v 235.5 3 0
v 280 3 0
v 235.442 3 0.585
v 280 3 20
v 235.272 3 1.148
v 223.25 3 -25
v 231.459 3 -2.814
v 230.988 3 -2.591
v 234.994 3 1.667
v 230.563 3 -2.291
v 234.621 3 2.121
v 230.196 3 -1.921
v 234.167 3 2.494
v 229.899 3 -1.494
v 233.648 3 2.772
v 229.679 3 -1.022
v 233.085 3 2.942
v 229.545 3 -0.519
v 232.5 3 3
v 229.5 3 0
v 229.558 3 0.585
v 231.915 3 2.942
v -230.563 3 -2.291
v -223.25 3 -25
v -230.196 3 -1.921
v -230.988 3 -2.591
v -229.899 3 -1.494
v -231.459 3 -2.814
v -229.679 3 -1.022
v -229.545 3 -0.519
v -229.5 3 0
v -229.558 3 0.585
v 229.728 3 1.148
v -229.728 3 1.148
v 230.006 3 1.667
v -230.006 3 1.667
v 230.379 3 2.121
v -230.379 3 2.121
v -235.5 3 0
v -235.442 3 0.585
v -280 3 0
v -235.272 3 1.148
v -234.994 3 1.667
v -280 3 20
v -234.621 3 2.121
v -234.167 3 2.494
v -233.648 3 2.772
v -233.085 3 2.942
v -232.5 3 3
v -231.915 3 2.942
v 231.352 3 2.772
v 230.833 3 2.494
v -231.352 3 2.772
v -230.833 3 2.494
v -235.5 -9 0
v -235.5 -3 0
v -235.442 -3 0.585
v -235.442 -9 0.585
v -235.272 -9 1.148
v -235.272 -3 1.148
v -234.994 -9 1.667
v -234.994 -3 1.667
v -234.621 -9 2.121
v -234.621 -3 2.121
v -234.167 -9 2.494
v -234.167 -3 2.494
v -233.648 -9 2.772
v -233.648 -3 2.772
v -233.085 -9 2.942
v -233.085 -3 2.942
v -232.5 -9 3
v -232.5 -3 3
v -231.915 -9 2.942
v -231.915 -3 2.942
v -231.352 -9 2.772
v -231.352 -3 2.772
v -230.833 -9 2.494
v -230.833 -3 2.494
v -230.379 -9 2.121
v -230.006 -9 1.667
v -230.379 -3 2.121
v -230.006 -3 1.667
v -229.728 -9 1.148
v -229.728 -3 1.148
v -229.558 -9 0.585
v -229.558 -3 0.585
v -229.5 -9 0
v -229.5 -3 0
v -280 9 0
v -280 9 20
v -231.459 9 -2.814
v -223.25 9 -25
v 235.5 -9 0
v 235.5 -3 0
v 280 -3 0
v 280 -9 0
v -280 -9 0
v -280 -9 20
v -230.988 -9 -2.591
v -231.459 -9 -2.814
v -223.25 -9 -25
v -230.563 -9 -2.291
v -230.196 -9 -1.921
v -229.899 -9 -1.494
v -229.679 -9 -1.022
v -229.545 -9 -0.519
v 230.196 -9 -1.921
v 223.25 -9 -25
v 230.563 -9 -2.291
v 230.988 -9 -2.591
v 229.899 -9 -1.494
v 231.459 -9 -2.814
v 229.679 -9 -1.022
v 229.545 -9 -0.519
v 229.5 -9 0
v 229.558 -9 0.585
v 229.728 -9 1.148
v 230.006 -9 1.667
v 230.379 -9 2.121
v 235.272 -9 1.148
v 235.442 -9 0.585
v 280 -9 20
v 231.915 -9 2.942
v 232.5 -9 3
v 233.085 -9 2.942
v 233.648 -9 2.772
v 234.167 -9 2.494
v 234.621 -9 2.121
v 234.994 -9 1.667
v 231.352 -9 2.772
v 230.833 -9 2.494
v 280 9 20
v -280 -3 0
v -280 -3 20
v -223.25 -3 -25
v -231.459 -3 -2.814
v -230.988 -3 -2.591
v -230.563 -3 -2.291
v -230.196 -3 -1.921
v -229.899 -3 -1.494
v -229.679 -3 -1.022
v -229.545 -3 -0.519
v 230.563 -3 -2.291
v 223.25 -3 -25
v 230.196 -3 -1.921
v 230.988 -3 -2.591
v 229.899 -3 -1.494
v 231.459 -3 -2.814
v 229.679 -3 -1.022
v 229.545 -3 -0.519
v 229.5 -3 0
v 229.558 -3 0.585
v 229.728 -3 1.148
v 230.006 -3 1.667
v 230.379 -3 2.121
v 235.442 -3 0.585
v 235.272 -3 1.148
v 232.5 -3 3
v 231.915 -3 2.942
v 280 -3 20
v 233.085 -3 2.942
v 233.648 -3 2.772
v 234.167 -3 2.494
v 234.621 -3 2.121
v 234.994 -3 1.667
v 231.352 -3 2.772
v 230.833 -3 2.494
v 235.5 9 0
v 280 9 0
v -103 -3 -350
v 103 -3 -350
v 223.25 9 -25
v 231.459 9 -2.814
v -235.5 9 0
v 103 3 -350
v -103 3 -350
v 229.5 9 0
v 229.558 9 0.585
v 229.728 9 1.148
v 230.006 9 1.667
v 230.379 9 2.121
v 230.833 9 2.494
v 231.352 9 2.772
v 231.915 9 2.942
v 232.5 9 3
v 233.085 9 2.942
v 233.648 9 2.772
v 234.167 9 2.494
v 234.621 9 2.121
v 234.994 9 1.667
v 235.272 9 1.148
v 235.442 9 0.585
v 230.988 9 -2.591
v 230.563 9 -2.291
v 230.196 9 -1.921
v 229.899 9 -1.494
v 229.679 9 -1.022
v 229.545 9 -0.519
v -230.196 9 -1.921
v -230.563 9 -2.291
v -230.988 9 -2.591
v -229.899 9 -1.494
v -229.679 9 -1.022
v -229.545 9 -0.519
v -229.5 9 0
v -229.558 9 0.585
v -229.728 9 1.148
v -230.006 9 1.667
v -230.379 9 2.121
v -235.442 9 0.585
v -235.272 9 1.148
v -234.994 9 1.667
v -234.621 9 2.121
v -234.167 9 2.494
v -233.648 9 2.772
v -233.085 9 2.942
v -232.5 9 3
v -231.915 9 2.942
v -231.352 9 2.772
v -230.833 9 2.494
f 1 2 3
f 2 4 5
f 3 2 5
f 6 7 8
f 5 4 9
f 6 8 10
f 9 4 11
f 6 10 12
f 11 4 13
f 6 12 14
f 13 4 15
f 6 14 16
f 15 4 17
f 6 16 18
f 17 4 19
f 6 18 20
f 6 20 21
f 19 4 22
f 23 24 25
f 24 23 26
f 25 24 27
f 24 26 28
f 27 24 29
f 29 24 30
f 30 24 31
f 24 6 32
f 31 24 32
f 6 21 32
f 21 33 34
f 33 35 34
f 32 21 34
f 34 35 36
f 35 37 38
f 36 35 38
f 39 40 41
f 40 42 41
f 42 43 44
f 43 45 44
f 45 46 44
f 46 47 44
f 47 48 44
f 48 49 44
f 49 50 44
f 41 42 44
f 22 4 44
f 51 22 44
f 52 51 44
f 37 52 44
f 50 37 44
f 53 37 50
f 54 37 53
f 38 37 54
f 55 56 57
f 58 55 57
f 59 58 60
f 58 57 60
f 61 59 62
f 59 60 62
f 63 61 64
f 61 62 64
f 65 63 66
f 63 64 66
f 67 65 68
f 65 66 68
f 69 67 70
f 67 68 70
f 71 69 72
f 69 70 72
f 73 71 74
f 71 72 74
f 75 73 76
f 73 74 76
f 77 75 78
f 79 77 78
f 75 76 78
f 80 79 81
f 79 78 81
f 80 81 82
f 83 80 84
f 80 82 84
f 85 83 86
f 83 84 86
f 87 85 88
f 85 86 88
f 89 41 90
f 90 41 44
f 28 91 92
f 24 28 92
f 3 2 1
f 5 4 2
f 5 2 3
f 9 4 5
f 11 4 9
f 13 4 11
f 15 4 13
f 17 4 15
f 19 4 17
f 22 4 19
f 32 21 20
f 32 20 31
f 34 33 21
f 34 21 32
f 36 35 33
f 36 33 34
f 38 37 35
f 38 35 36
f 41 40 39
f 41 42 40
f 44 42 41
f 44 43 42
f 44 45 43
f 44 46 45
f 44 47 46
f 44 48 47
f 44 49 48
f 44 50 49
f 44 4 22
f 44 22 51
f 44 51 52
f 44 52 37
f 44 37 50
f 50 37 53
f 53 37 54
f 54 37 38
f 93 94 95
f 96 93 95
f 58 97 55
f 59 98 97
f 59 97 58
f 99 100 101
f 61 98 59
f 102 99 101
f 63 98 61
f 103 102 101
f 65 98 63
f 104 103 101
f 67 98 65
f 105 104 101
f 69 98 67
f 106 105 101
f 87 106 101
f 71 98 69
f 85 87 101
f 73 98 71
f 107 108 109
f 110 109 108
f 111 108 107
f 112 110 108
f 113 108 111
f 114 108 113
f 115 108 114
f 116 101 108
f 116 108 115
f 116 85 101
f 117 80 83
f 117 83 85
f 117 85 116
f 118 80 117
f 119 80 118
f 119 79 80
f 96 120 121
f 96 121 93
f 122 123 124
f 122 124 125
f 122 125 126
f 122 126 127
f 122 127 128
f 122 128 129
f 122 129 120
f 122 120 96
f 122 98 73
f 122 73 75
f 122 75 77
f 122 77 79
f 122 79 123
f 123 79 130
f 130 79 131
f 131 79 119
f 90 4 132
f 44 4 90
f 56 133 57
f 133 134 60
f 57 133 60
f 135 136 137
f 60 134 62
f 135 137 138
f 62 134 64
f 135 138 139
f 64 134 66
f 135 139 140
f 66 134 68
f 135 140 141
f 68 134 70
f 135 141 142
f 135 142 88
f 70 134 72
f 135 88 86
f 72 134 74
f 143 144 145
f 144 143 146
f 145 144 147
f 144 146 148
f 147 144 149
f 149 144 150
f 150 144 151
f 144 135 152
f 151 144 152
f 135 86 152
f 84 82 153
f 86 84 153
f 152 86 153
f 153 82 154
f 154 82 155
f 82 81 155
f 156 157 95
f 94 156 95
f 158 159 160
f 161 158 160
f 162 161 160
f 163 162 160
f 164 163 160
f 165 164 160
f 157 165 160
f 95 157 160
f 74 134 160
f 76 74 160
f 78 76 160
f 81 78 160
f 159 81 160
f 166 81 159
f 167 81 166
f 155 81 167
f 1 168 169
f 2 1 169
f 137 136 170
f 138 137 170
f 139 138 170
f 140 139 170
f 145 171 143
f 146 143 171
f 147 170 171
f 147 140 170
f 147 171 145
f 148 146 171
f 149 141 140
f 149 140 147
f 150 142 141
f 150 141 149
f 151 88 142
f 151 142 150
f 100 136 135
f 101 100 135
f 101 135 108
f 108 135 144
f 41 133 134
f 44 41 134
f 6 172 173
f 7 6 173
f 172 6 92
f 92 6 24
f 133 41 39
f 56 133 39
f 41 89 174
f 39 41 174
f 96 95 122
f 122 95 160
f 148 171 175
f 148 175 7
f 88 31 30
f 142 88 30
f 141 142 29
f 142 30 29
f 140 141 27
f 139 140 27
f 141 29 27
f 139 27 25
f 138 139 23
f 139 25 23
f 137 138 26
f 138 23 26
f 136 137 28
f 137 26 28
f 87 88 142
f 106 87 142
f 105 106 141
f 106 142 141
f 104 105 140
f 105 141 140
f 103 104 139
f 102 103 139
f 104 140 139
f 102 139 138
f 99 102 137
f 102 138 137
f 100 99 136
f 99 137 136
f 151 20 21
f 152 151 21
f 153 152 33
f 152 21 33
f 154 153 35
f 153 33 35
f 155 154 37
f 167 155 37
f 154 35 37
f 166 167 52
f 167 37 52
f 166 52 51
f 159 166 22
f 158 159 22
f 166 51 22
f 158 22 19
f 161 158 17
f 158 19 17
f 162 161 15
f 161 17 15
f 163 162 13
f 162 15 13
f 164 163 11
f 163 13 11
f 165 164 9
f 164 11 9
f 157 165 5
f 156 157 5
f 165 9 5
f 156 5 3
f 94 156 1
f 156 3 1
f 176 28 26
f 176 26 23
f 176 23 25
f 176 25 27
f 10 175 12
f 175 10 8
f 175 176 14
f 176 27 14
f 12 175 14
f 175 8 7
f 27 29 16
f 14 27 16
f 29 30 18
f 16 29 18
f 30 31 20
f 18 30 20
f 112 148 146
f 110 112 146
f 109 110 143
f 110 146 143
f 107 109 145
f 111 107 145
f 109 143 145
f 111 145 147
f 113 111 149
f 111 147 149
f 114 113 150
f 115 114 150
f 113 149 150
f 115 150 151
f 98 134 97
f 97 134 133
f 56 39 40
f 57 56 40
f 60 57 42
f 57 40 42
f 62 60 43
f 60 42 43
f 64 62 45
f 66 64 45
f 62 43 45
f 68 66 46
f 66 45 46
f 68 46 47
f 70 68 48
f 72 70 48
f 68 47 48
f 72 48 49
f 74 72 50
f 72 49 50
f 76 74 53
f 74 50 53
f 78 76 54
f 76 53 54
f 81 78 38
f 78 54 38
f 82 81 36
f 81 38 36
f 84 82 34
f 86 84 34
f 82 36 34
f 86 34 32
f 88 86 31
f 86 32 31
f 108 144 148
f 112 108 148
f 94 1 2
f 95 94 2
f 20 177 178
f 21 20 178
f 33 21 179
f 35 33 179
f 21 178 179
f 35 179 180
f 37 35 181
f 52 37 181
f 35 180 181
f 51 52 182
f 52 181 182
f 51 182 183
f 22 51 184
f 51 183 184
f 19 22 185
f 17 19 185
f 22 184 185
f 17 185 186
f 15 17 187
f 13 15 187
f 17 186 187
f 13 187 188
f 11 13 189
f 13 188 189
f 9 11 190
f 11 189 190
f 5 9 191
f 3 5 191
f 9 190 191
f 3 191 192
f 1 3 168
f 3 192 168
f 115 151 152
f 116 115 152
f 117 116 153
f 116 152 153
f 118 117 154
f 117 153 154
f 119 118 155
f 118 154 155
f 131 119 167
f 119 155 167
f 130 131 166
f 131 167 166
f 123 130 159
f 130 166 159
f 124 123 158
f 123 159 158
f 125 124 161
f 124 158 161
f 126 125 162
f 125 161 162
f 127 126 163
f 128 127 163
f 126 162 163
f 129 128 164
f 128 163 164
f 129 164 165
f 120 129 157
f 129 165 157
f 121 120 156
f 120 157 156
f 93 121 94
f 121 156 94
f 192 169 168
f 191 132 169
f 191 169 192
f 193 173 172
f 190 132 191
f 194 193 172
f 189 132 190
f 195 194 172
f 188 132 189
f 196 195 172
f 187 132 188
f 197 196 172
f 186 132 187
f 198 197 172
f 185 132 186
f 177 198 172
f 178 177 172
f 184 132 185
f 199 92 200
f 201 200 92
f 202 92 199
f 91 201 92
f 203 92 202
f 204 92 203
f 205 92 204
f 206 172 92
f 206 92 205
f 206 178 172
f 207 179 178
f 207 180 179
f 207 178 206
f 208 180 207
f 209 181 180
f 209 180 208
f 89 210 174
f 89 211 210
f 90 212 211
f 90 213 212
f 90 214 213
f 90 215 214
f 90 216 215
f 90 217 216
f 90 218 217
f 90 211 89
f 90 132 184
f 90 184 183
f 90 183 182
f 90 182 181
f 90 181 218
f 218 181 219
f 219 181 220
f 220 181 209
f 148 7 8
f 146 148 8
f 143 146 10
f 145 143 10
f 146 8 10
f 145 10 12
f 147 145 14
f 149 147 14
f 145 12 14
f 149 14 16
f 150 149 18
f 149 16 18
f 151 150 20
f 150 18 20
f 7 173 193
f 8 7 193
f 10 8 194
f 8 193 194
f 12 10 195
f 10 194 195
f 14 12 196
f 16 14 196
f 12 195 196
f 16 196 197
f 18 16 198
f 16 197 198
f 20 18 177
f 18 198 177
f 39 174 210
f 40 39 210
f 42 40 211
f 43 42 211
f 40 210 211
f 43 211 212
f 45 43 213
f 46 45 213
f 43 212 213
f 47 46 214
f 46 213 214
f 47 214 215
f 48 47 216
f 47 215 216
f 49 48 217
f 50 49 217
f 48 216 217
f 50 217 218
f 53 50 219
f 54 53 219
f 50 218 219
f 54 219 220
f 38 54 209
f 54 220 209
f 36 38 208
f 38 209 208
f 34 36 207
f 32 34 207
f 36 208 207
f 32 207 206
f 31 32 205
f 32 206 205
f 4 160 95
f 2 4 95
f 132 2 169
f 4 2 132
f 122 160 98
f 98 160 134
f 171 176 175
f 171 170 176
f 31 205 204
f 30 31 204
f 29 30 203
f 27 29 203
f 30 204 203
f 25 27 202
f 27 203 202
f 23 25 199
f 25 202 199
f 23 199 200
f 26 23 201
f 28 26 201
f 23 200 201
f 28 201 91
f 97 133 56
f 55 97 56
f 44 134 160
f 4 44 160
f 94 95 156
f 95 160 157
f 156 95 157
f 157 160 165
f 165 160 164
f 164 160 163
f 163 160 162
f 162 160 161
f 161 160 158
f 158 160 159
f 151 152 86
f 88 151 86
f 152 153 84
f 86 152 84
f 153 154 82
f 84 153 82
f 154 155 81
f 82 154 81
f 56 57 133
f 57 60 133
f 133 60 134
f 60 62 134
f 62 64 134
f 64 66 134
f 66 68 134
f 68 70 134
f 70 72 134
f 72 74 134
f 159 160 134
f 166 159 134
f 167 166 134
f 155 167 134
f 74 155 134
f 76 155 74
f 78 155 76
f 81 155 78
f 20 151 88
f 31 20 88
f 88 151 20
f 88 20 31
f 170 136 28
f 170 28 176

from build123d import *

# Parameters (mm, degrees)
F1_DEPTH = 3
F3_DEPTH = 6
F4_W     = 560
F4_H     = 45
F5_DEPTH = 6
F7_DEPTH = 6
F9_DEPTH = 18.001


with BuildPart() as f1:
    # F0 (on Front) → F1 (new body, symmetric)
    with BuildSketch(Plane.XZ):
        Polygon((-103, -350), (0, -350), (103, -350), (232.5, 0), (-232.5, 0), align=None)
    extrude(amount=F1_DEPTH, both=True)


with BuildPart() as f3:
    # F2 (on face) → F3 (new body)
    with BuildSketch(Plane.XZ.offset(3)):
        Polygon((-280, 20), (-280, -25), (-223.25, -25), (-232.5, 0), (232.5, 0), (223.25, -25), (280, -25), (280, 20), align=None)
        Polygon((-232.5, 0), (-223.25, -25), (223.25, -25), (232.5, 0), align=None)
    extrude(amount=F3_DEPTH)


with BuildPart() as f5:
    # F4 (on face) → F5 (new body)
    with BuildSketch(Plane(origin=(0, 3, 0), x_dir=(-1, 0, 0), z_dir=(0, 1, 0))):
        with Locations((0, -2.5)):
            Rectangle(F4_W, F4_H)
    extrude(amount=F5_DEPTH)


with BuildPart() as f7:
    # F6 (on face) → F7 (new body)
    with BuildSketch(Plane(origin=(0, -3, 0), x_dir=(-1, 0, 0), z_dir=(0, 1, 0))):
        Polygon((-280, 20), (-280, -25), (-223.25, -25), (-232.5, 0), (232.5, 0), (223.25, -25), (280, -25), (280, 20), align=None)
    extrude(amount=F7_DEPTH)


with BuildPart() as f9_tool:
    # F8 (on face) → F9 (new body, through all)
    with BuildSketch(Plane(origin=(0, 9, 0), x_dir=(-1, 0, 0), z_dir=(0, 1, 0))):
        with BuildLine():
            ThreePointArc((-231.458973, -2.813586), (-234.214194, -2.462019), (-235.5, 0))
            Line((-235.5, 0), (-280, 0))
            Line((-280, 0), (-280, -25))
            Line((-280, -25), (-223.279387, -25))
            Line((-223.279387, -25), (-223.25, -25))
            Line((-223.25, -25), (-231.458973, -2.813586))
        make_face()
        with BuildLine():
            Line((231.458973, -2.813586), (223.25, -25))
            Line((223.25, -25), (223.279387, -25))
            Line((223.279387, -25), (280, -25))
            Line((280, -25), (280, 0))
            Line((280, 0), (235.5, 0))
            ThreePointArc((235.5, 0), (234.214194, -2.462019), (231.458973, -2.813586))
        make_face()
        with BuildLine():
            Line((-229.5, 0), (-232.5, 0))
            Line((-232.5, 0), (-231.458973, -2.813586))
            ThreePointArc((-231.458973, -2.813586), (-230.037981, -1.714194), (-229.5, 0))
        make_face()
        with BuildLine():
            Line((-231.458973, -2.813586), (-232.5, 0))
            Line((-232.5, 0), (-235.5, 0))
            ThreePointArc((-235.5, 0), (-234.214194, -2.462019), (-231.458973, -2.813586))
        make_face()
        with BuildLine():
            Line((-235.5, 0), (-232.5, 0))
            Line((-232.5, 0), (-229.5, 0))
            ThreePointArc((-229.5, 0), (-232.5, 3), (-235.5, 0))
        make_face()
        with BuildLine():
            ThreePointArc((229.5, 0), (230.037981, -1.714194), (231.458973, -2.813586))
            Line((231.458973, -2.813586), (232.5, 0))
            Line((232.5, 0), (229.5, 0))
        make_face()
        with BuildLine():
            Line((229.5, 0), (232.5, 0))
            Line((232.5, 0), (235.5, 0))
            ThreePointArc((235.5, 0), (232.5, 3), (229.5, 0))
        make_face()
        with BuildLine():
            Line((232.5, 0), (231.458973, -2.813586))
            ThreePointArc((231.458973, -2.813586), (234.214194, -2.462019), (235.5, 0))
            Line((235.5, 0), (232.5, 0))
        make_face()
    extrude(amount=-F9_DEPTH)


with BuildPart() as f1_1:
    add(f1.part)

    # F9: cut by f9_tool
    add(f9_tool.part, mode=Mode.SUBTRACT)


with BuildPart() as f3_1:
    add(f3.part)

    # F9: cut by f9_tool
    add(f9_tool.part, mode=Mode.SUBTRACT)


with BuildPart() as f5_1:
    add(f5.part)

    # F9: cut by f9_tool
    add(f9_tool.part, mode=Mode.SUBTRACT)


with BuildPart() as f7_1:
    add(f7.part)

    # F9: cut by f9_tool
    add(f9_tool.part, mode=Mode.SUBTRACT)


solid = Compound([f1_1.part, f3_1.part, f5_1.part, f7_1.part])
